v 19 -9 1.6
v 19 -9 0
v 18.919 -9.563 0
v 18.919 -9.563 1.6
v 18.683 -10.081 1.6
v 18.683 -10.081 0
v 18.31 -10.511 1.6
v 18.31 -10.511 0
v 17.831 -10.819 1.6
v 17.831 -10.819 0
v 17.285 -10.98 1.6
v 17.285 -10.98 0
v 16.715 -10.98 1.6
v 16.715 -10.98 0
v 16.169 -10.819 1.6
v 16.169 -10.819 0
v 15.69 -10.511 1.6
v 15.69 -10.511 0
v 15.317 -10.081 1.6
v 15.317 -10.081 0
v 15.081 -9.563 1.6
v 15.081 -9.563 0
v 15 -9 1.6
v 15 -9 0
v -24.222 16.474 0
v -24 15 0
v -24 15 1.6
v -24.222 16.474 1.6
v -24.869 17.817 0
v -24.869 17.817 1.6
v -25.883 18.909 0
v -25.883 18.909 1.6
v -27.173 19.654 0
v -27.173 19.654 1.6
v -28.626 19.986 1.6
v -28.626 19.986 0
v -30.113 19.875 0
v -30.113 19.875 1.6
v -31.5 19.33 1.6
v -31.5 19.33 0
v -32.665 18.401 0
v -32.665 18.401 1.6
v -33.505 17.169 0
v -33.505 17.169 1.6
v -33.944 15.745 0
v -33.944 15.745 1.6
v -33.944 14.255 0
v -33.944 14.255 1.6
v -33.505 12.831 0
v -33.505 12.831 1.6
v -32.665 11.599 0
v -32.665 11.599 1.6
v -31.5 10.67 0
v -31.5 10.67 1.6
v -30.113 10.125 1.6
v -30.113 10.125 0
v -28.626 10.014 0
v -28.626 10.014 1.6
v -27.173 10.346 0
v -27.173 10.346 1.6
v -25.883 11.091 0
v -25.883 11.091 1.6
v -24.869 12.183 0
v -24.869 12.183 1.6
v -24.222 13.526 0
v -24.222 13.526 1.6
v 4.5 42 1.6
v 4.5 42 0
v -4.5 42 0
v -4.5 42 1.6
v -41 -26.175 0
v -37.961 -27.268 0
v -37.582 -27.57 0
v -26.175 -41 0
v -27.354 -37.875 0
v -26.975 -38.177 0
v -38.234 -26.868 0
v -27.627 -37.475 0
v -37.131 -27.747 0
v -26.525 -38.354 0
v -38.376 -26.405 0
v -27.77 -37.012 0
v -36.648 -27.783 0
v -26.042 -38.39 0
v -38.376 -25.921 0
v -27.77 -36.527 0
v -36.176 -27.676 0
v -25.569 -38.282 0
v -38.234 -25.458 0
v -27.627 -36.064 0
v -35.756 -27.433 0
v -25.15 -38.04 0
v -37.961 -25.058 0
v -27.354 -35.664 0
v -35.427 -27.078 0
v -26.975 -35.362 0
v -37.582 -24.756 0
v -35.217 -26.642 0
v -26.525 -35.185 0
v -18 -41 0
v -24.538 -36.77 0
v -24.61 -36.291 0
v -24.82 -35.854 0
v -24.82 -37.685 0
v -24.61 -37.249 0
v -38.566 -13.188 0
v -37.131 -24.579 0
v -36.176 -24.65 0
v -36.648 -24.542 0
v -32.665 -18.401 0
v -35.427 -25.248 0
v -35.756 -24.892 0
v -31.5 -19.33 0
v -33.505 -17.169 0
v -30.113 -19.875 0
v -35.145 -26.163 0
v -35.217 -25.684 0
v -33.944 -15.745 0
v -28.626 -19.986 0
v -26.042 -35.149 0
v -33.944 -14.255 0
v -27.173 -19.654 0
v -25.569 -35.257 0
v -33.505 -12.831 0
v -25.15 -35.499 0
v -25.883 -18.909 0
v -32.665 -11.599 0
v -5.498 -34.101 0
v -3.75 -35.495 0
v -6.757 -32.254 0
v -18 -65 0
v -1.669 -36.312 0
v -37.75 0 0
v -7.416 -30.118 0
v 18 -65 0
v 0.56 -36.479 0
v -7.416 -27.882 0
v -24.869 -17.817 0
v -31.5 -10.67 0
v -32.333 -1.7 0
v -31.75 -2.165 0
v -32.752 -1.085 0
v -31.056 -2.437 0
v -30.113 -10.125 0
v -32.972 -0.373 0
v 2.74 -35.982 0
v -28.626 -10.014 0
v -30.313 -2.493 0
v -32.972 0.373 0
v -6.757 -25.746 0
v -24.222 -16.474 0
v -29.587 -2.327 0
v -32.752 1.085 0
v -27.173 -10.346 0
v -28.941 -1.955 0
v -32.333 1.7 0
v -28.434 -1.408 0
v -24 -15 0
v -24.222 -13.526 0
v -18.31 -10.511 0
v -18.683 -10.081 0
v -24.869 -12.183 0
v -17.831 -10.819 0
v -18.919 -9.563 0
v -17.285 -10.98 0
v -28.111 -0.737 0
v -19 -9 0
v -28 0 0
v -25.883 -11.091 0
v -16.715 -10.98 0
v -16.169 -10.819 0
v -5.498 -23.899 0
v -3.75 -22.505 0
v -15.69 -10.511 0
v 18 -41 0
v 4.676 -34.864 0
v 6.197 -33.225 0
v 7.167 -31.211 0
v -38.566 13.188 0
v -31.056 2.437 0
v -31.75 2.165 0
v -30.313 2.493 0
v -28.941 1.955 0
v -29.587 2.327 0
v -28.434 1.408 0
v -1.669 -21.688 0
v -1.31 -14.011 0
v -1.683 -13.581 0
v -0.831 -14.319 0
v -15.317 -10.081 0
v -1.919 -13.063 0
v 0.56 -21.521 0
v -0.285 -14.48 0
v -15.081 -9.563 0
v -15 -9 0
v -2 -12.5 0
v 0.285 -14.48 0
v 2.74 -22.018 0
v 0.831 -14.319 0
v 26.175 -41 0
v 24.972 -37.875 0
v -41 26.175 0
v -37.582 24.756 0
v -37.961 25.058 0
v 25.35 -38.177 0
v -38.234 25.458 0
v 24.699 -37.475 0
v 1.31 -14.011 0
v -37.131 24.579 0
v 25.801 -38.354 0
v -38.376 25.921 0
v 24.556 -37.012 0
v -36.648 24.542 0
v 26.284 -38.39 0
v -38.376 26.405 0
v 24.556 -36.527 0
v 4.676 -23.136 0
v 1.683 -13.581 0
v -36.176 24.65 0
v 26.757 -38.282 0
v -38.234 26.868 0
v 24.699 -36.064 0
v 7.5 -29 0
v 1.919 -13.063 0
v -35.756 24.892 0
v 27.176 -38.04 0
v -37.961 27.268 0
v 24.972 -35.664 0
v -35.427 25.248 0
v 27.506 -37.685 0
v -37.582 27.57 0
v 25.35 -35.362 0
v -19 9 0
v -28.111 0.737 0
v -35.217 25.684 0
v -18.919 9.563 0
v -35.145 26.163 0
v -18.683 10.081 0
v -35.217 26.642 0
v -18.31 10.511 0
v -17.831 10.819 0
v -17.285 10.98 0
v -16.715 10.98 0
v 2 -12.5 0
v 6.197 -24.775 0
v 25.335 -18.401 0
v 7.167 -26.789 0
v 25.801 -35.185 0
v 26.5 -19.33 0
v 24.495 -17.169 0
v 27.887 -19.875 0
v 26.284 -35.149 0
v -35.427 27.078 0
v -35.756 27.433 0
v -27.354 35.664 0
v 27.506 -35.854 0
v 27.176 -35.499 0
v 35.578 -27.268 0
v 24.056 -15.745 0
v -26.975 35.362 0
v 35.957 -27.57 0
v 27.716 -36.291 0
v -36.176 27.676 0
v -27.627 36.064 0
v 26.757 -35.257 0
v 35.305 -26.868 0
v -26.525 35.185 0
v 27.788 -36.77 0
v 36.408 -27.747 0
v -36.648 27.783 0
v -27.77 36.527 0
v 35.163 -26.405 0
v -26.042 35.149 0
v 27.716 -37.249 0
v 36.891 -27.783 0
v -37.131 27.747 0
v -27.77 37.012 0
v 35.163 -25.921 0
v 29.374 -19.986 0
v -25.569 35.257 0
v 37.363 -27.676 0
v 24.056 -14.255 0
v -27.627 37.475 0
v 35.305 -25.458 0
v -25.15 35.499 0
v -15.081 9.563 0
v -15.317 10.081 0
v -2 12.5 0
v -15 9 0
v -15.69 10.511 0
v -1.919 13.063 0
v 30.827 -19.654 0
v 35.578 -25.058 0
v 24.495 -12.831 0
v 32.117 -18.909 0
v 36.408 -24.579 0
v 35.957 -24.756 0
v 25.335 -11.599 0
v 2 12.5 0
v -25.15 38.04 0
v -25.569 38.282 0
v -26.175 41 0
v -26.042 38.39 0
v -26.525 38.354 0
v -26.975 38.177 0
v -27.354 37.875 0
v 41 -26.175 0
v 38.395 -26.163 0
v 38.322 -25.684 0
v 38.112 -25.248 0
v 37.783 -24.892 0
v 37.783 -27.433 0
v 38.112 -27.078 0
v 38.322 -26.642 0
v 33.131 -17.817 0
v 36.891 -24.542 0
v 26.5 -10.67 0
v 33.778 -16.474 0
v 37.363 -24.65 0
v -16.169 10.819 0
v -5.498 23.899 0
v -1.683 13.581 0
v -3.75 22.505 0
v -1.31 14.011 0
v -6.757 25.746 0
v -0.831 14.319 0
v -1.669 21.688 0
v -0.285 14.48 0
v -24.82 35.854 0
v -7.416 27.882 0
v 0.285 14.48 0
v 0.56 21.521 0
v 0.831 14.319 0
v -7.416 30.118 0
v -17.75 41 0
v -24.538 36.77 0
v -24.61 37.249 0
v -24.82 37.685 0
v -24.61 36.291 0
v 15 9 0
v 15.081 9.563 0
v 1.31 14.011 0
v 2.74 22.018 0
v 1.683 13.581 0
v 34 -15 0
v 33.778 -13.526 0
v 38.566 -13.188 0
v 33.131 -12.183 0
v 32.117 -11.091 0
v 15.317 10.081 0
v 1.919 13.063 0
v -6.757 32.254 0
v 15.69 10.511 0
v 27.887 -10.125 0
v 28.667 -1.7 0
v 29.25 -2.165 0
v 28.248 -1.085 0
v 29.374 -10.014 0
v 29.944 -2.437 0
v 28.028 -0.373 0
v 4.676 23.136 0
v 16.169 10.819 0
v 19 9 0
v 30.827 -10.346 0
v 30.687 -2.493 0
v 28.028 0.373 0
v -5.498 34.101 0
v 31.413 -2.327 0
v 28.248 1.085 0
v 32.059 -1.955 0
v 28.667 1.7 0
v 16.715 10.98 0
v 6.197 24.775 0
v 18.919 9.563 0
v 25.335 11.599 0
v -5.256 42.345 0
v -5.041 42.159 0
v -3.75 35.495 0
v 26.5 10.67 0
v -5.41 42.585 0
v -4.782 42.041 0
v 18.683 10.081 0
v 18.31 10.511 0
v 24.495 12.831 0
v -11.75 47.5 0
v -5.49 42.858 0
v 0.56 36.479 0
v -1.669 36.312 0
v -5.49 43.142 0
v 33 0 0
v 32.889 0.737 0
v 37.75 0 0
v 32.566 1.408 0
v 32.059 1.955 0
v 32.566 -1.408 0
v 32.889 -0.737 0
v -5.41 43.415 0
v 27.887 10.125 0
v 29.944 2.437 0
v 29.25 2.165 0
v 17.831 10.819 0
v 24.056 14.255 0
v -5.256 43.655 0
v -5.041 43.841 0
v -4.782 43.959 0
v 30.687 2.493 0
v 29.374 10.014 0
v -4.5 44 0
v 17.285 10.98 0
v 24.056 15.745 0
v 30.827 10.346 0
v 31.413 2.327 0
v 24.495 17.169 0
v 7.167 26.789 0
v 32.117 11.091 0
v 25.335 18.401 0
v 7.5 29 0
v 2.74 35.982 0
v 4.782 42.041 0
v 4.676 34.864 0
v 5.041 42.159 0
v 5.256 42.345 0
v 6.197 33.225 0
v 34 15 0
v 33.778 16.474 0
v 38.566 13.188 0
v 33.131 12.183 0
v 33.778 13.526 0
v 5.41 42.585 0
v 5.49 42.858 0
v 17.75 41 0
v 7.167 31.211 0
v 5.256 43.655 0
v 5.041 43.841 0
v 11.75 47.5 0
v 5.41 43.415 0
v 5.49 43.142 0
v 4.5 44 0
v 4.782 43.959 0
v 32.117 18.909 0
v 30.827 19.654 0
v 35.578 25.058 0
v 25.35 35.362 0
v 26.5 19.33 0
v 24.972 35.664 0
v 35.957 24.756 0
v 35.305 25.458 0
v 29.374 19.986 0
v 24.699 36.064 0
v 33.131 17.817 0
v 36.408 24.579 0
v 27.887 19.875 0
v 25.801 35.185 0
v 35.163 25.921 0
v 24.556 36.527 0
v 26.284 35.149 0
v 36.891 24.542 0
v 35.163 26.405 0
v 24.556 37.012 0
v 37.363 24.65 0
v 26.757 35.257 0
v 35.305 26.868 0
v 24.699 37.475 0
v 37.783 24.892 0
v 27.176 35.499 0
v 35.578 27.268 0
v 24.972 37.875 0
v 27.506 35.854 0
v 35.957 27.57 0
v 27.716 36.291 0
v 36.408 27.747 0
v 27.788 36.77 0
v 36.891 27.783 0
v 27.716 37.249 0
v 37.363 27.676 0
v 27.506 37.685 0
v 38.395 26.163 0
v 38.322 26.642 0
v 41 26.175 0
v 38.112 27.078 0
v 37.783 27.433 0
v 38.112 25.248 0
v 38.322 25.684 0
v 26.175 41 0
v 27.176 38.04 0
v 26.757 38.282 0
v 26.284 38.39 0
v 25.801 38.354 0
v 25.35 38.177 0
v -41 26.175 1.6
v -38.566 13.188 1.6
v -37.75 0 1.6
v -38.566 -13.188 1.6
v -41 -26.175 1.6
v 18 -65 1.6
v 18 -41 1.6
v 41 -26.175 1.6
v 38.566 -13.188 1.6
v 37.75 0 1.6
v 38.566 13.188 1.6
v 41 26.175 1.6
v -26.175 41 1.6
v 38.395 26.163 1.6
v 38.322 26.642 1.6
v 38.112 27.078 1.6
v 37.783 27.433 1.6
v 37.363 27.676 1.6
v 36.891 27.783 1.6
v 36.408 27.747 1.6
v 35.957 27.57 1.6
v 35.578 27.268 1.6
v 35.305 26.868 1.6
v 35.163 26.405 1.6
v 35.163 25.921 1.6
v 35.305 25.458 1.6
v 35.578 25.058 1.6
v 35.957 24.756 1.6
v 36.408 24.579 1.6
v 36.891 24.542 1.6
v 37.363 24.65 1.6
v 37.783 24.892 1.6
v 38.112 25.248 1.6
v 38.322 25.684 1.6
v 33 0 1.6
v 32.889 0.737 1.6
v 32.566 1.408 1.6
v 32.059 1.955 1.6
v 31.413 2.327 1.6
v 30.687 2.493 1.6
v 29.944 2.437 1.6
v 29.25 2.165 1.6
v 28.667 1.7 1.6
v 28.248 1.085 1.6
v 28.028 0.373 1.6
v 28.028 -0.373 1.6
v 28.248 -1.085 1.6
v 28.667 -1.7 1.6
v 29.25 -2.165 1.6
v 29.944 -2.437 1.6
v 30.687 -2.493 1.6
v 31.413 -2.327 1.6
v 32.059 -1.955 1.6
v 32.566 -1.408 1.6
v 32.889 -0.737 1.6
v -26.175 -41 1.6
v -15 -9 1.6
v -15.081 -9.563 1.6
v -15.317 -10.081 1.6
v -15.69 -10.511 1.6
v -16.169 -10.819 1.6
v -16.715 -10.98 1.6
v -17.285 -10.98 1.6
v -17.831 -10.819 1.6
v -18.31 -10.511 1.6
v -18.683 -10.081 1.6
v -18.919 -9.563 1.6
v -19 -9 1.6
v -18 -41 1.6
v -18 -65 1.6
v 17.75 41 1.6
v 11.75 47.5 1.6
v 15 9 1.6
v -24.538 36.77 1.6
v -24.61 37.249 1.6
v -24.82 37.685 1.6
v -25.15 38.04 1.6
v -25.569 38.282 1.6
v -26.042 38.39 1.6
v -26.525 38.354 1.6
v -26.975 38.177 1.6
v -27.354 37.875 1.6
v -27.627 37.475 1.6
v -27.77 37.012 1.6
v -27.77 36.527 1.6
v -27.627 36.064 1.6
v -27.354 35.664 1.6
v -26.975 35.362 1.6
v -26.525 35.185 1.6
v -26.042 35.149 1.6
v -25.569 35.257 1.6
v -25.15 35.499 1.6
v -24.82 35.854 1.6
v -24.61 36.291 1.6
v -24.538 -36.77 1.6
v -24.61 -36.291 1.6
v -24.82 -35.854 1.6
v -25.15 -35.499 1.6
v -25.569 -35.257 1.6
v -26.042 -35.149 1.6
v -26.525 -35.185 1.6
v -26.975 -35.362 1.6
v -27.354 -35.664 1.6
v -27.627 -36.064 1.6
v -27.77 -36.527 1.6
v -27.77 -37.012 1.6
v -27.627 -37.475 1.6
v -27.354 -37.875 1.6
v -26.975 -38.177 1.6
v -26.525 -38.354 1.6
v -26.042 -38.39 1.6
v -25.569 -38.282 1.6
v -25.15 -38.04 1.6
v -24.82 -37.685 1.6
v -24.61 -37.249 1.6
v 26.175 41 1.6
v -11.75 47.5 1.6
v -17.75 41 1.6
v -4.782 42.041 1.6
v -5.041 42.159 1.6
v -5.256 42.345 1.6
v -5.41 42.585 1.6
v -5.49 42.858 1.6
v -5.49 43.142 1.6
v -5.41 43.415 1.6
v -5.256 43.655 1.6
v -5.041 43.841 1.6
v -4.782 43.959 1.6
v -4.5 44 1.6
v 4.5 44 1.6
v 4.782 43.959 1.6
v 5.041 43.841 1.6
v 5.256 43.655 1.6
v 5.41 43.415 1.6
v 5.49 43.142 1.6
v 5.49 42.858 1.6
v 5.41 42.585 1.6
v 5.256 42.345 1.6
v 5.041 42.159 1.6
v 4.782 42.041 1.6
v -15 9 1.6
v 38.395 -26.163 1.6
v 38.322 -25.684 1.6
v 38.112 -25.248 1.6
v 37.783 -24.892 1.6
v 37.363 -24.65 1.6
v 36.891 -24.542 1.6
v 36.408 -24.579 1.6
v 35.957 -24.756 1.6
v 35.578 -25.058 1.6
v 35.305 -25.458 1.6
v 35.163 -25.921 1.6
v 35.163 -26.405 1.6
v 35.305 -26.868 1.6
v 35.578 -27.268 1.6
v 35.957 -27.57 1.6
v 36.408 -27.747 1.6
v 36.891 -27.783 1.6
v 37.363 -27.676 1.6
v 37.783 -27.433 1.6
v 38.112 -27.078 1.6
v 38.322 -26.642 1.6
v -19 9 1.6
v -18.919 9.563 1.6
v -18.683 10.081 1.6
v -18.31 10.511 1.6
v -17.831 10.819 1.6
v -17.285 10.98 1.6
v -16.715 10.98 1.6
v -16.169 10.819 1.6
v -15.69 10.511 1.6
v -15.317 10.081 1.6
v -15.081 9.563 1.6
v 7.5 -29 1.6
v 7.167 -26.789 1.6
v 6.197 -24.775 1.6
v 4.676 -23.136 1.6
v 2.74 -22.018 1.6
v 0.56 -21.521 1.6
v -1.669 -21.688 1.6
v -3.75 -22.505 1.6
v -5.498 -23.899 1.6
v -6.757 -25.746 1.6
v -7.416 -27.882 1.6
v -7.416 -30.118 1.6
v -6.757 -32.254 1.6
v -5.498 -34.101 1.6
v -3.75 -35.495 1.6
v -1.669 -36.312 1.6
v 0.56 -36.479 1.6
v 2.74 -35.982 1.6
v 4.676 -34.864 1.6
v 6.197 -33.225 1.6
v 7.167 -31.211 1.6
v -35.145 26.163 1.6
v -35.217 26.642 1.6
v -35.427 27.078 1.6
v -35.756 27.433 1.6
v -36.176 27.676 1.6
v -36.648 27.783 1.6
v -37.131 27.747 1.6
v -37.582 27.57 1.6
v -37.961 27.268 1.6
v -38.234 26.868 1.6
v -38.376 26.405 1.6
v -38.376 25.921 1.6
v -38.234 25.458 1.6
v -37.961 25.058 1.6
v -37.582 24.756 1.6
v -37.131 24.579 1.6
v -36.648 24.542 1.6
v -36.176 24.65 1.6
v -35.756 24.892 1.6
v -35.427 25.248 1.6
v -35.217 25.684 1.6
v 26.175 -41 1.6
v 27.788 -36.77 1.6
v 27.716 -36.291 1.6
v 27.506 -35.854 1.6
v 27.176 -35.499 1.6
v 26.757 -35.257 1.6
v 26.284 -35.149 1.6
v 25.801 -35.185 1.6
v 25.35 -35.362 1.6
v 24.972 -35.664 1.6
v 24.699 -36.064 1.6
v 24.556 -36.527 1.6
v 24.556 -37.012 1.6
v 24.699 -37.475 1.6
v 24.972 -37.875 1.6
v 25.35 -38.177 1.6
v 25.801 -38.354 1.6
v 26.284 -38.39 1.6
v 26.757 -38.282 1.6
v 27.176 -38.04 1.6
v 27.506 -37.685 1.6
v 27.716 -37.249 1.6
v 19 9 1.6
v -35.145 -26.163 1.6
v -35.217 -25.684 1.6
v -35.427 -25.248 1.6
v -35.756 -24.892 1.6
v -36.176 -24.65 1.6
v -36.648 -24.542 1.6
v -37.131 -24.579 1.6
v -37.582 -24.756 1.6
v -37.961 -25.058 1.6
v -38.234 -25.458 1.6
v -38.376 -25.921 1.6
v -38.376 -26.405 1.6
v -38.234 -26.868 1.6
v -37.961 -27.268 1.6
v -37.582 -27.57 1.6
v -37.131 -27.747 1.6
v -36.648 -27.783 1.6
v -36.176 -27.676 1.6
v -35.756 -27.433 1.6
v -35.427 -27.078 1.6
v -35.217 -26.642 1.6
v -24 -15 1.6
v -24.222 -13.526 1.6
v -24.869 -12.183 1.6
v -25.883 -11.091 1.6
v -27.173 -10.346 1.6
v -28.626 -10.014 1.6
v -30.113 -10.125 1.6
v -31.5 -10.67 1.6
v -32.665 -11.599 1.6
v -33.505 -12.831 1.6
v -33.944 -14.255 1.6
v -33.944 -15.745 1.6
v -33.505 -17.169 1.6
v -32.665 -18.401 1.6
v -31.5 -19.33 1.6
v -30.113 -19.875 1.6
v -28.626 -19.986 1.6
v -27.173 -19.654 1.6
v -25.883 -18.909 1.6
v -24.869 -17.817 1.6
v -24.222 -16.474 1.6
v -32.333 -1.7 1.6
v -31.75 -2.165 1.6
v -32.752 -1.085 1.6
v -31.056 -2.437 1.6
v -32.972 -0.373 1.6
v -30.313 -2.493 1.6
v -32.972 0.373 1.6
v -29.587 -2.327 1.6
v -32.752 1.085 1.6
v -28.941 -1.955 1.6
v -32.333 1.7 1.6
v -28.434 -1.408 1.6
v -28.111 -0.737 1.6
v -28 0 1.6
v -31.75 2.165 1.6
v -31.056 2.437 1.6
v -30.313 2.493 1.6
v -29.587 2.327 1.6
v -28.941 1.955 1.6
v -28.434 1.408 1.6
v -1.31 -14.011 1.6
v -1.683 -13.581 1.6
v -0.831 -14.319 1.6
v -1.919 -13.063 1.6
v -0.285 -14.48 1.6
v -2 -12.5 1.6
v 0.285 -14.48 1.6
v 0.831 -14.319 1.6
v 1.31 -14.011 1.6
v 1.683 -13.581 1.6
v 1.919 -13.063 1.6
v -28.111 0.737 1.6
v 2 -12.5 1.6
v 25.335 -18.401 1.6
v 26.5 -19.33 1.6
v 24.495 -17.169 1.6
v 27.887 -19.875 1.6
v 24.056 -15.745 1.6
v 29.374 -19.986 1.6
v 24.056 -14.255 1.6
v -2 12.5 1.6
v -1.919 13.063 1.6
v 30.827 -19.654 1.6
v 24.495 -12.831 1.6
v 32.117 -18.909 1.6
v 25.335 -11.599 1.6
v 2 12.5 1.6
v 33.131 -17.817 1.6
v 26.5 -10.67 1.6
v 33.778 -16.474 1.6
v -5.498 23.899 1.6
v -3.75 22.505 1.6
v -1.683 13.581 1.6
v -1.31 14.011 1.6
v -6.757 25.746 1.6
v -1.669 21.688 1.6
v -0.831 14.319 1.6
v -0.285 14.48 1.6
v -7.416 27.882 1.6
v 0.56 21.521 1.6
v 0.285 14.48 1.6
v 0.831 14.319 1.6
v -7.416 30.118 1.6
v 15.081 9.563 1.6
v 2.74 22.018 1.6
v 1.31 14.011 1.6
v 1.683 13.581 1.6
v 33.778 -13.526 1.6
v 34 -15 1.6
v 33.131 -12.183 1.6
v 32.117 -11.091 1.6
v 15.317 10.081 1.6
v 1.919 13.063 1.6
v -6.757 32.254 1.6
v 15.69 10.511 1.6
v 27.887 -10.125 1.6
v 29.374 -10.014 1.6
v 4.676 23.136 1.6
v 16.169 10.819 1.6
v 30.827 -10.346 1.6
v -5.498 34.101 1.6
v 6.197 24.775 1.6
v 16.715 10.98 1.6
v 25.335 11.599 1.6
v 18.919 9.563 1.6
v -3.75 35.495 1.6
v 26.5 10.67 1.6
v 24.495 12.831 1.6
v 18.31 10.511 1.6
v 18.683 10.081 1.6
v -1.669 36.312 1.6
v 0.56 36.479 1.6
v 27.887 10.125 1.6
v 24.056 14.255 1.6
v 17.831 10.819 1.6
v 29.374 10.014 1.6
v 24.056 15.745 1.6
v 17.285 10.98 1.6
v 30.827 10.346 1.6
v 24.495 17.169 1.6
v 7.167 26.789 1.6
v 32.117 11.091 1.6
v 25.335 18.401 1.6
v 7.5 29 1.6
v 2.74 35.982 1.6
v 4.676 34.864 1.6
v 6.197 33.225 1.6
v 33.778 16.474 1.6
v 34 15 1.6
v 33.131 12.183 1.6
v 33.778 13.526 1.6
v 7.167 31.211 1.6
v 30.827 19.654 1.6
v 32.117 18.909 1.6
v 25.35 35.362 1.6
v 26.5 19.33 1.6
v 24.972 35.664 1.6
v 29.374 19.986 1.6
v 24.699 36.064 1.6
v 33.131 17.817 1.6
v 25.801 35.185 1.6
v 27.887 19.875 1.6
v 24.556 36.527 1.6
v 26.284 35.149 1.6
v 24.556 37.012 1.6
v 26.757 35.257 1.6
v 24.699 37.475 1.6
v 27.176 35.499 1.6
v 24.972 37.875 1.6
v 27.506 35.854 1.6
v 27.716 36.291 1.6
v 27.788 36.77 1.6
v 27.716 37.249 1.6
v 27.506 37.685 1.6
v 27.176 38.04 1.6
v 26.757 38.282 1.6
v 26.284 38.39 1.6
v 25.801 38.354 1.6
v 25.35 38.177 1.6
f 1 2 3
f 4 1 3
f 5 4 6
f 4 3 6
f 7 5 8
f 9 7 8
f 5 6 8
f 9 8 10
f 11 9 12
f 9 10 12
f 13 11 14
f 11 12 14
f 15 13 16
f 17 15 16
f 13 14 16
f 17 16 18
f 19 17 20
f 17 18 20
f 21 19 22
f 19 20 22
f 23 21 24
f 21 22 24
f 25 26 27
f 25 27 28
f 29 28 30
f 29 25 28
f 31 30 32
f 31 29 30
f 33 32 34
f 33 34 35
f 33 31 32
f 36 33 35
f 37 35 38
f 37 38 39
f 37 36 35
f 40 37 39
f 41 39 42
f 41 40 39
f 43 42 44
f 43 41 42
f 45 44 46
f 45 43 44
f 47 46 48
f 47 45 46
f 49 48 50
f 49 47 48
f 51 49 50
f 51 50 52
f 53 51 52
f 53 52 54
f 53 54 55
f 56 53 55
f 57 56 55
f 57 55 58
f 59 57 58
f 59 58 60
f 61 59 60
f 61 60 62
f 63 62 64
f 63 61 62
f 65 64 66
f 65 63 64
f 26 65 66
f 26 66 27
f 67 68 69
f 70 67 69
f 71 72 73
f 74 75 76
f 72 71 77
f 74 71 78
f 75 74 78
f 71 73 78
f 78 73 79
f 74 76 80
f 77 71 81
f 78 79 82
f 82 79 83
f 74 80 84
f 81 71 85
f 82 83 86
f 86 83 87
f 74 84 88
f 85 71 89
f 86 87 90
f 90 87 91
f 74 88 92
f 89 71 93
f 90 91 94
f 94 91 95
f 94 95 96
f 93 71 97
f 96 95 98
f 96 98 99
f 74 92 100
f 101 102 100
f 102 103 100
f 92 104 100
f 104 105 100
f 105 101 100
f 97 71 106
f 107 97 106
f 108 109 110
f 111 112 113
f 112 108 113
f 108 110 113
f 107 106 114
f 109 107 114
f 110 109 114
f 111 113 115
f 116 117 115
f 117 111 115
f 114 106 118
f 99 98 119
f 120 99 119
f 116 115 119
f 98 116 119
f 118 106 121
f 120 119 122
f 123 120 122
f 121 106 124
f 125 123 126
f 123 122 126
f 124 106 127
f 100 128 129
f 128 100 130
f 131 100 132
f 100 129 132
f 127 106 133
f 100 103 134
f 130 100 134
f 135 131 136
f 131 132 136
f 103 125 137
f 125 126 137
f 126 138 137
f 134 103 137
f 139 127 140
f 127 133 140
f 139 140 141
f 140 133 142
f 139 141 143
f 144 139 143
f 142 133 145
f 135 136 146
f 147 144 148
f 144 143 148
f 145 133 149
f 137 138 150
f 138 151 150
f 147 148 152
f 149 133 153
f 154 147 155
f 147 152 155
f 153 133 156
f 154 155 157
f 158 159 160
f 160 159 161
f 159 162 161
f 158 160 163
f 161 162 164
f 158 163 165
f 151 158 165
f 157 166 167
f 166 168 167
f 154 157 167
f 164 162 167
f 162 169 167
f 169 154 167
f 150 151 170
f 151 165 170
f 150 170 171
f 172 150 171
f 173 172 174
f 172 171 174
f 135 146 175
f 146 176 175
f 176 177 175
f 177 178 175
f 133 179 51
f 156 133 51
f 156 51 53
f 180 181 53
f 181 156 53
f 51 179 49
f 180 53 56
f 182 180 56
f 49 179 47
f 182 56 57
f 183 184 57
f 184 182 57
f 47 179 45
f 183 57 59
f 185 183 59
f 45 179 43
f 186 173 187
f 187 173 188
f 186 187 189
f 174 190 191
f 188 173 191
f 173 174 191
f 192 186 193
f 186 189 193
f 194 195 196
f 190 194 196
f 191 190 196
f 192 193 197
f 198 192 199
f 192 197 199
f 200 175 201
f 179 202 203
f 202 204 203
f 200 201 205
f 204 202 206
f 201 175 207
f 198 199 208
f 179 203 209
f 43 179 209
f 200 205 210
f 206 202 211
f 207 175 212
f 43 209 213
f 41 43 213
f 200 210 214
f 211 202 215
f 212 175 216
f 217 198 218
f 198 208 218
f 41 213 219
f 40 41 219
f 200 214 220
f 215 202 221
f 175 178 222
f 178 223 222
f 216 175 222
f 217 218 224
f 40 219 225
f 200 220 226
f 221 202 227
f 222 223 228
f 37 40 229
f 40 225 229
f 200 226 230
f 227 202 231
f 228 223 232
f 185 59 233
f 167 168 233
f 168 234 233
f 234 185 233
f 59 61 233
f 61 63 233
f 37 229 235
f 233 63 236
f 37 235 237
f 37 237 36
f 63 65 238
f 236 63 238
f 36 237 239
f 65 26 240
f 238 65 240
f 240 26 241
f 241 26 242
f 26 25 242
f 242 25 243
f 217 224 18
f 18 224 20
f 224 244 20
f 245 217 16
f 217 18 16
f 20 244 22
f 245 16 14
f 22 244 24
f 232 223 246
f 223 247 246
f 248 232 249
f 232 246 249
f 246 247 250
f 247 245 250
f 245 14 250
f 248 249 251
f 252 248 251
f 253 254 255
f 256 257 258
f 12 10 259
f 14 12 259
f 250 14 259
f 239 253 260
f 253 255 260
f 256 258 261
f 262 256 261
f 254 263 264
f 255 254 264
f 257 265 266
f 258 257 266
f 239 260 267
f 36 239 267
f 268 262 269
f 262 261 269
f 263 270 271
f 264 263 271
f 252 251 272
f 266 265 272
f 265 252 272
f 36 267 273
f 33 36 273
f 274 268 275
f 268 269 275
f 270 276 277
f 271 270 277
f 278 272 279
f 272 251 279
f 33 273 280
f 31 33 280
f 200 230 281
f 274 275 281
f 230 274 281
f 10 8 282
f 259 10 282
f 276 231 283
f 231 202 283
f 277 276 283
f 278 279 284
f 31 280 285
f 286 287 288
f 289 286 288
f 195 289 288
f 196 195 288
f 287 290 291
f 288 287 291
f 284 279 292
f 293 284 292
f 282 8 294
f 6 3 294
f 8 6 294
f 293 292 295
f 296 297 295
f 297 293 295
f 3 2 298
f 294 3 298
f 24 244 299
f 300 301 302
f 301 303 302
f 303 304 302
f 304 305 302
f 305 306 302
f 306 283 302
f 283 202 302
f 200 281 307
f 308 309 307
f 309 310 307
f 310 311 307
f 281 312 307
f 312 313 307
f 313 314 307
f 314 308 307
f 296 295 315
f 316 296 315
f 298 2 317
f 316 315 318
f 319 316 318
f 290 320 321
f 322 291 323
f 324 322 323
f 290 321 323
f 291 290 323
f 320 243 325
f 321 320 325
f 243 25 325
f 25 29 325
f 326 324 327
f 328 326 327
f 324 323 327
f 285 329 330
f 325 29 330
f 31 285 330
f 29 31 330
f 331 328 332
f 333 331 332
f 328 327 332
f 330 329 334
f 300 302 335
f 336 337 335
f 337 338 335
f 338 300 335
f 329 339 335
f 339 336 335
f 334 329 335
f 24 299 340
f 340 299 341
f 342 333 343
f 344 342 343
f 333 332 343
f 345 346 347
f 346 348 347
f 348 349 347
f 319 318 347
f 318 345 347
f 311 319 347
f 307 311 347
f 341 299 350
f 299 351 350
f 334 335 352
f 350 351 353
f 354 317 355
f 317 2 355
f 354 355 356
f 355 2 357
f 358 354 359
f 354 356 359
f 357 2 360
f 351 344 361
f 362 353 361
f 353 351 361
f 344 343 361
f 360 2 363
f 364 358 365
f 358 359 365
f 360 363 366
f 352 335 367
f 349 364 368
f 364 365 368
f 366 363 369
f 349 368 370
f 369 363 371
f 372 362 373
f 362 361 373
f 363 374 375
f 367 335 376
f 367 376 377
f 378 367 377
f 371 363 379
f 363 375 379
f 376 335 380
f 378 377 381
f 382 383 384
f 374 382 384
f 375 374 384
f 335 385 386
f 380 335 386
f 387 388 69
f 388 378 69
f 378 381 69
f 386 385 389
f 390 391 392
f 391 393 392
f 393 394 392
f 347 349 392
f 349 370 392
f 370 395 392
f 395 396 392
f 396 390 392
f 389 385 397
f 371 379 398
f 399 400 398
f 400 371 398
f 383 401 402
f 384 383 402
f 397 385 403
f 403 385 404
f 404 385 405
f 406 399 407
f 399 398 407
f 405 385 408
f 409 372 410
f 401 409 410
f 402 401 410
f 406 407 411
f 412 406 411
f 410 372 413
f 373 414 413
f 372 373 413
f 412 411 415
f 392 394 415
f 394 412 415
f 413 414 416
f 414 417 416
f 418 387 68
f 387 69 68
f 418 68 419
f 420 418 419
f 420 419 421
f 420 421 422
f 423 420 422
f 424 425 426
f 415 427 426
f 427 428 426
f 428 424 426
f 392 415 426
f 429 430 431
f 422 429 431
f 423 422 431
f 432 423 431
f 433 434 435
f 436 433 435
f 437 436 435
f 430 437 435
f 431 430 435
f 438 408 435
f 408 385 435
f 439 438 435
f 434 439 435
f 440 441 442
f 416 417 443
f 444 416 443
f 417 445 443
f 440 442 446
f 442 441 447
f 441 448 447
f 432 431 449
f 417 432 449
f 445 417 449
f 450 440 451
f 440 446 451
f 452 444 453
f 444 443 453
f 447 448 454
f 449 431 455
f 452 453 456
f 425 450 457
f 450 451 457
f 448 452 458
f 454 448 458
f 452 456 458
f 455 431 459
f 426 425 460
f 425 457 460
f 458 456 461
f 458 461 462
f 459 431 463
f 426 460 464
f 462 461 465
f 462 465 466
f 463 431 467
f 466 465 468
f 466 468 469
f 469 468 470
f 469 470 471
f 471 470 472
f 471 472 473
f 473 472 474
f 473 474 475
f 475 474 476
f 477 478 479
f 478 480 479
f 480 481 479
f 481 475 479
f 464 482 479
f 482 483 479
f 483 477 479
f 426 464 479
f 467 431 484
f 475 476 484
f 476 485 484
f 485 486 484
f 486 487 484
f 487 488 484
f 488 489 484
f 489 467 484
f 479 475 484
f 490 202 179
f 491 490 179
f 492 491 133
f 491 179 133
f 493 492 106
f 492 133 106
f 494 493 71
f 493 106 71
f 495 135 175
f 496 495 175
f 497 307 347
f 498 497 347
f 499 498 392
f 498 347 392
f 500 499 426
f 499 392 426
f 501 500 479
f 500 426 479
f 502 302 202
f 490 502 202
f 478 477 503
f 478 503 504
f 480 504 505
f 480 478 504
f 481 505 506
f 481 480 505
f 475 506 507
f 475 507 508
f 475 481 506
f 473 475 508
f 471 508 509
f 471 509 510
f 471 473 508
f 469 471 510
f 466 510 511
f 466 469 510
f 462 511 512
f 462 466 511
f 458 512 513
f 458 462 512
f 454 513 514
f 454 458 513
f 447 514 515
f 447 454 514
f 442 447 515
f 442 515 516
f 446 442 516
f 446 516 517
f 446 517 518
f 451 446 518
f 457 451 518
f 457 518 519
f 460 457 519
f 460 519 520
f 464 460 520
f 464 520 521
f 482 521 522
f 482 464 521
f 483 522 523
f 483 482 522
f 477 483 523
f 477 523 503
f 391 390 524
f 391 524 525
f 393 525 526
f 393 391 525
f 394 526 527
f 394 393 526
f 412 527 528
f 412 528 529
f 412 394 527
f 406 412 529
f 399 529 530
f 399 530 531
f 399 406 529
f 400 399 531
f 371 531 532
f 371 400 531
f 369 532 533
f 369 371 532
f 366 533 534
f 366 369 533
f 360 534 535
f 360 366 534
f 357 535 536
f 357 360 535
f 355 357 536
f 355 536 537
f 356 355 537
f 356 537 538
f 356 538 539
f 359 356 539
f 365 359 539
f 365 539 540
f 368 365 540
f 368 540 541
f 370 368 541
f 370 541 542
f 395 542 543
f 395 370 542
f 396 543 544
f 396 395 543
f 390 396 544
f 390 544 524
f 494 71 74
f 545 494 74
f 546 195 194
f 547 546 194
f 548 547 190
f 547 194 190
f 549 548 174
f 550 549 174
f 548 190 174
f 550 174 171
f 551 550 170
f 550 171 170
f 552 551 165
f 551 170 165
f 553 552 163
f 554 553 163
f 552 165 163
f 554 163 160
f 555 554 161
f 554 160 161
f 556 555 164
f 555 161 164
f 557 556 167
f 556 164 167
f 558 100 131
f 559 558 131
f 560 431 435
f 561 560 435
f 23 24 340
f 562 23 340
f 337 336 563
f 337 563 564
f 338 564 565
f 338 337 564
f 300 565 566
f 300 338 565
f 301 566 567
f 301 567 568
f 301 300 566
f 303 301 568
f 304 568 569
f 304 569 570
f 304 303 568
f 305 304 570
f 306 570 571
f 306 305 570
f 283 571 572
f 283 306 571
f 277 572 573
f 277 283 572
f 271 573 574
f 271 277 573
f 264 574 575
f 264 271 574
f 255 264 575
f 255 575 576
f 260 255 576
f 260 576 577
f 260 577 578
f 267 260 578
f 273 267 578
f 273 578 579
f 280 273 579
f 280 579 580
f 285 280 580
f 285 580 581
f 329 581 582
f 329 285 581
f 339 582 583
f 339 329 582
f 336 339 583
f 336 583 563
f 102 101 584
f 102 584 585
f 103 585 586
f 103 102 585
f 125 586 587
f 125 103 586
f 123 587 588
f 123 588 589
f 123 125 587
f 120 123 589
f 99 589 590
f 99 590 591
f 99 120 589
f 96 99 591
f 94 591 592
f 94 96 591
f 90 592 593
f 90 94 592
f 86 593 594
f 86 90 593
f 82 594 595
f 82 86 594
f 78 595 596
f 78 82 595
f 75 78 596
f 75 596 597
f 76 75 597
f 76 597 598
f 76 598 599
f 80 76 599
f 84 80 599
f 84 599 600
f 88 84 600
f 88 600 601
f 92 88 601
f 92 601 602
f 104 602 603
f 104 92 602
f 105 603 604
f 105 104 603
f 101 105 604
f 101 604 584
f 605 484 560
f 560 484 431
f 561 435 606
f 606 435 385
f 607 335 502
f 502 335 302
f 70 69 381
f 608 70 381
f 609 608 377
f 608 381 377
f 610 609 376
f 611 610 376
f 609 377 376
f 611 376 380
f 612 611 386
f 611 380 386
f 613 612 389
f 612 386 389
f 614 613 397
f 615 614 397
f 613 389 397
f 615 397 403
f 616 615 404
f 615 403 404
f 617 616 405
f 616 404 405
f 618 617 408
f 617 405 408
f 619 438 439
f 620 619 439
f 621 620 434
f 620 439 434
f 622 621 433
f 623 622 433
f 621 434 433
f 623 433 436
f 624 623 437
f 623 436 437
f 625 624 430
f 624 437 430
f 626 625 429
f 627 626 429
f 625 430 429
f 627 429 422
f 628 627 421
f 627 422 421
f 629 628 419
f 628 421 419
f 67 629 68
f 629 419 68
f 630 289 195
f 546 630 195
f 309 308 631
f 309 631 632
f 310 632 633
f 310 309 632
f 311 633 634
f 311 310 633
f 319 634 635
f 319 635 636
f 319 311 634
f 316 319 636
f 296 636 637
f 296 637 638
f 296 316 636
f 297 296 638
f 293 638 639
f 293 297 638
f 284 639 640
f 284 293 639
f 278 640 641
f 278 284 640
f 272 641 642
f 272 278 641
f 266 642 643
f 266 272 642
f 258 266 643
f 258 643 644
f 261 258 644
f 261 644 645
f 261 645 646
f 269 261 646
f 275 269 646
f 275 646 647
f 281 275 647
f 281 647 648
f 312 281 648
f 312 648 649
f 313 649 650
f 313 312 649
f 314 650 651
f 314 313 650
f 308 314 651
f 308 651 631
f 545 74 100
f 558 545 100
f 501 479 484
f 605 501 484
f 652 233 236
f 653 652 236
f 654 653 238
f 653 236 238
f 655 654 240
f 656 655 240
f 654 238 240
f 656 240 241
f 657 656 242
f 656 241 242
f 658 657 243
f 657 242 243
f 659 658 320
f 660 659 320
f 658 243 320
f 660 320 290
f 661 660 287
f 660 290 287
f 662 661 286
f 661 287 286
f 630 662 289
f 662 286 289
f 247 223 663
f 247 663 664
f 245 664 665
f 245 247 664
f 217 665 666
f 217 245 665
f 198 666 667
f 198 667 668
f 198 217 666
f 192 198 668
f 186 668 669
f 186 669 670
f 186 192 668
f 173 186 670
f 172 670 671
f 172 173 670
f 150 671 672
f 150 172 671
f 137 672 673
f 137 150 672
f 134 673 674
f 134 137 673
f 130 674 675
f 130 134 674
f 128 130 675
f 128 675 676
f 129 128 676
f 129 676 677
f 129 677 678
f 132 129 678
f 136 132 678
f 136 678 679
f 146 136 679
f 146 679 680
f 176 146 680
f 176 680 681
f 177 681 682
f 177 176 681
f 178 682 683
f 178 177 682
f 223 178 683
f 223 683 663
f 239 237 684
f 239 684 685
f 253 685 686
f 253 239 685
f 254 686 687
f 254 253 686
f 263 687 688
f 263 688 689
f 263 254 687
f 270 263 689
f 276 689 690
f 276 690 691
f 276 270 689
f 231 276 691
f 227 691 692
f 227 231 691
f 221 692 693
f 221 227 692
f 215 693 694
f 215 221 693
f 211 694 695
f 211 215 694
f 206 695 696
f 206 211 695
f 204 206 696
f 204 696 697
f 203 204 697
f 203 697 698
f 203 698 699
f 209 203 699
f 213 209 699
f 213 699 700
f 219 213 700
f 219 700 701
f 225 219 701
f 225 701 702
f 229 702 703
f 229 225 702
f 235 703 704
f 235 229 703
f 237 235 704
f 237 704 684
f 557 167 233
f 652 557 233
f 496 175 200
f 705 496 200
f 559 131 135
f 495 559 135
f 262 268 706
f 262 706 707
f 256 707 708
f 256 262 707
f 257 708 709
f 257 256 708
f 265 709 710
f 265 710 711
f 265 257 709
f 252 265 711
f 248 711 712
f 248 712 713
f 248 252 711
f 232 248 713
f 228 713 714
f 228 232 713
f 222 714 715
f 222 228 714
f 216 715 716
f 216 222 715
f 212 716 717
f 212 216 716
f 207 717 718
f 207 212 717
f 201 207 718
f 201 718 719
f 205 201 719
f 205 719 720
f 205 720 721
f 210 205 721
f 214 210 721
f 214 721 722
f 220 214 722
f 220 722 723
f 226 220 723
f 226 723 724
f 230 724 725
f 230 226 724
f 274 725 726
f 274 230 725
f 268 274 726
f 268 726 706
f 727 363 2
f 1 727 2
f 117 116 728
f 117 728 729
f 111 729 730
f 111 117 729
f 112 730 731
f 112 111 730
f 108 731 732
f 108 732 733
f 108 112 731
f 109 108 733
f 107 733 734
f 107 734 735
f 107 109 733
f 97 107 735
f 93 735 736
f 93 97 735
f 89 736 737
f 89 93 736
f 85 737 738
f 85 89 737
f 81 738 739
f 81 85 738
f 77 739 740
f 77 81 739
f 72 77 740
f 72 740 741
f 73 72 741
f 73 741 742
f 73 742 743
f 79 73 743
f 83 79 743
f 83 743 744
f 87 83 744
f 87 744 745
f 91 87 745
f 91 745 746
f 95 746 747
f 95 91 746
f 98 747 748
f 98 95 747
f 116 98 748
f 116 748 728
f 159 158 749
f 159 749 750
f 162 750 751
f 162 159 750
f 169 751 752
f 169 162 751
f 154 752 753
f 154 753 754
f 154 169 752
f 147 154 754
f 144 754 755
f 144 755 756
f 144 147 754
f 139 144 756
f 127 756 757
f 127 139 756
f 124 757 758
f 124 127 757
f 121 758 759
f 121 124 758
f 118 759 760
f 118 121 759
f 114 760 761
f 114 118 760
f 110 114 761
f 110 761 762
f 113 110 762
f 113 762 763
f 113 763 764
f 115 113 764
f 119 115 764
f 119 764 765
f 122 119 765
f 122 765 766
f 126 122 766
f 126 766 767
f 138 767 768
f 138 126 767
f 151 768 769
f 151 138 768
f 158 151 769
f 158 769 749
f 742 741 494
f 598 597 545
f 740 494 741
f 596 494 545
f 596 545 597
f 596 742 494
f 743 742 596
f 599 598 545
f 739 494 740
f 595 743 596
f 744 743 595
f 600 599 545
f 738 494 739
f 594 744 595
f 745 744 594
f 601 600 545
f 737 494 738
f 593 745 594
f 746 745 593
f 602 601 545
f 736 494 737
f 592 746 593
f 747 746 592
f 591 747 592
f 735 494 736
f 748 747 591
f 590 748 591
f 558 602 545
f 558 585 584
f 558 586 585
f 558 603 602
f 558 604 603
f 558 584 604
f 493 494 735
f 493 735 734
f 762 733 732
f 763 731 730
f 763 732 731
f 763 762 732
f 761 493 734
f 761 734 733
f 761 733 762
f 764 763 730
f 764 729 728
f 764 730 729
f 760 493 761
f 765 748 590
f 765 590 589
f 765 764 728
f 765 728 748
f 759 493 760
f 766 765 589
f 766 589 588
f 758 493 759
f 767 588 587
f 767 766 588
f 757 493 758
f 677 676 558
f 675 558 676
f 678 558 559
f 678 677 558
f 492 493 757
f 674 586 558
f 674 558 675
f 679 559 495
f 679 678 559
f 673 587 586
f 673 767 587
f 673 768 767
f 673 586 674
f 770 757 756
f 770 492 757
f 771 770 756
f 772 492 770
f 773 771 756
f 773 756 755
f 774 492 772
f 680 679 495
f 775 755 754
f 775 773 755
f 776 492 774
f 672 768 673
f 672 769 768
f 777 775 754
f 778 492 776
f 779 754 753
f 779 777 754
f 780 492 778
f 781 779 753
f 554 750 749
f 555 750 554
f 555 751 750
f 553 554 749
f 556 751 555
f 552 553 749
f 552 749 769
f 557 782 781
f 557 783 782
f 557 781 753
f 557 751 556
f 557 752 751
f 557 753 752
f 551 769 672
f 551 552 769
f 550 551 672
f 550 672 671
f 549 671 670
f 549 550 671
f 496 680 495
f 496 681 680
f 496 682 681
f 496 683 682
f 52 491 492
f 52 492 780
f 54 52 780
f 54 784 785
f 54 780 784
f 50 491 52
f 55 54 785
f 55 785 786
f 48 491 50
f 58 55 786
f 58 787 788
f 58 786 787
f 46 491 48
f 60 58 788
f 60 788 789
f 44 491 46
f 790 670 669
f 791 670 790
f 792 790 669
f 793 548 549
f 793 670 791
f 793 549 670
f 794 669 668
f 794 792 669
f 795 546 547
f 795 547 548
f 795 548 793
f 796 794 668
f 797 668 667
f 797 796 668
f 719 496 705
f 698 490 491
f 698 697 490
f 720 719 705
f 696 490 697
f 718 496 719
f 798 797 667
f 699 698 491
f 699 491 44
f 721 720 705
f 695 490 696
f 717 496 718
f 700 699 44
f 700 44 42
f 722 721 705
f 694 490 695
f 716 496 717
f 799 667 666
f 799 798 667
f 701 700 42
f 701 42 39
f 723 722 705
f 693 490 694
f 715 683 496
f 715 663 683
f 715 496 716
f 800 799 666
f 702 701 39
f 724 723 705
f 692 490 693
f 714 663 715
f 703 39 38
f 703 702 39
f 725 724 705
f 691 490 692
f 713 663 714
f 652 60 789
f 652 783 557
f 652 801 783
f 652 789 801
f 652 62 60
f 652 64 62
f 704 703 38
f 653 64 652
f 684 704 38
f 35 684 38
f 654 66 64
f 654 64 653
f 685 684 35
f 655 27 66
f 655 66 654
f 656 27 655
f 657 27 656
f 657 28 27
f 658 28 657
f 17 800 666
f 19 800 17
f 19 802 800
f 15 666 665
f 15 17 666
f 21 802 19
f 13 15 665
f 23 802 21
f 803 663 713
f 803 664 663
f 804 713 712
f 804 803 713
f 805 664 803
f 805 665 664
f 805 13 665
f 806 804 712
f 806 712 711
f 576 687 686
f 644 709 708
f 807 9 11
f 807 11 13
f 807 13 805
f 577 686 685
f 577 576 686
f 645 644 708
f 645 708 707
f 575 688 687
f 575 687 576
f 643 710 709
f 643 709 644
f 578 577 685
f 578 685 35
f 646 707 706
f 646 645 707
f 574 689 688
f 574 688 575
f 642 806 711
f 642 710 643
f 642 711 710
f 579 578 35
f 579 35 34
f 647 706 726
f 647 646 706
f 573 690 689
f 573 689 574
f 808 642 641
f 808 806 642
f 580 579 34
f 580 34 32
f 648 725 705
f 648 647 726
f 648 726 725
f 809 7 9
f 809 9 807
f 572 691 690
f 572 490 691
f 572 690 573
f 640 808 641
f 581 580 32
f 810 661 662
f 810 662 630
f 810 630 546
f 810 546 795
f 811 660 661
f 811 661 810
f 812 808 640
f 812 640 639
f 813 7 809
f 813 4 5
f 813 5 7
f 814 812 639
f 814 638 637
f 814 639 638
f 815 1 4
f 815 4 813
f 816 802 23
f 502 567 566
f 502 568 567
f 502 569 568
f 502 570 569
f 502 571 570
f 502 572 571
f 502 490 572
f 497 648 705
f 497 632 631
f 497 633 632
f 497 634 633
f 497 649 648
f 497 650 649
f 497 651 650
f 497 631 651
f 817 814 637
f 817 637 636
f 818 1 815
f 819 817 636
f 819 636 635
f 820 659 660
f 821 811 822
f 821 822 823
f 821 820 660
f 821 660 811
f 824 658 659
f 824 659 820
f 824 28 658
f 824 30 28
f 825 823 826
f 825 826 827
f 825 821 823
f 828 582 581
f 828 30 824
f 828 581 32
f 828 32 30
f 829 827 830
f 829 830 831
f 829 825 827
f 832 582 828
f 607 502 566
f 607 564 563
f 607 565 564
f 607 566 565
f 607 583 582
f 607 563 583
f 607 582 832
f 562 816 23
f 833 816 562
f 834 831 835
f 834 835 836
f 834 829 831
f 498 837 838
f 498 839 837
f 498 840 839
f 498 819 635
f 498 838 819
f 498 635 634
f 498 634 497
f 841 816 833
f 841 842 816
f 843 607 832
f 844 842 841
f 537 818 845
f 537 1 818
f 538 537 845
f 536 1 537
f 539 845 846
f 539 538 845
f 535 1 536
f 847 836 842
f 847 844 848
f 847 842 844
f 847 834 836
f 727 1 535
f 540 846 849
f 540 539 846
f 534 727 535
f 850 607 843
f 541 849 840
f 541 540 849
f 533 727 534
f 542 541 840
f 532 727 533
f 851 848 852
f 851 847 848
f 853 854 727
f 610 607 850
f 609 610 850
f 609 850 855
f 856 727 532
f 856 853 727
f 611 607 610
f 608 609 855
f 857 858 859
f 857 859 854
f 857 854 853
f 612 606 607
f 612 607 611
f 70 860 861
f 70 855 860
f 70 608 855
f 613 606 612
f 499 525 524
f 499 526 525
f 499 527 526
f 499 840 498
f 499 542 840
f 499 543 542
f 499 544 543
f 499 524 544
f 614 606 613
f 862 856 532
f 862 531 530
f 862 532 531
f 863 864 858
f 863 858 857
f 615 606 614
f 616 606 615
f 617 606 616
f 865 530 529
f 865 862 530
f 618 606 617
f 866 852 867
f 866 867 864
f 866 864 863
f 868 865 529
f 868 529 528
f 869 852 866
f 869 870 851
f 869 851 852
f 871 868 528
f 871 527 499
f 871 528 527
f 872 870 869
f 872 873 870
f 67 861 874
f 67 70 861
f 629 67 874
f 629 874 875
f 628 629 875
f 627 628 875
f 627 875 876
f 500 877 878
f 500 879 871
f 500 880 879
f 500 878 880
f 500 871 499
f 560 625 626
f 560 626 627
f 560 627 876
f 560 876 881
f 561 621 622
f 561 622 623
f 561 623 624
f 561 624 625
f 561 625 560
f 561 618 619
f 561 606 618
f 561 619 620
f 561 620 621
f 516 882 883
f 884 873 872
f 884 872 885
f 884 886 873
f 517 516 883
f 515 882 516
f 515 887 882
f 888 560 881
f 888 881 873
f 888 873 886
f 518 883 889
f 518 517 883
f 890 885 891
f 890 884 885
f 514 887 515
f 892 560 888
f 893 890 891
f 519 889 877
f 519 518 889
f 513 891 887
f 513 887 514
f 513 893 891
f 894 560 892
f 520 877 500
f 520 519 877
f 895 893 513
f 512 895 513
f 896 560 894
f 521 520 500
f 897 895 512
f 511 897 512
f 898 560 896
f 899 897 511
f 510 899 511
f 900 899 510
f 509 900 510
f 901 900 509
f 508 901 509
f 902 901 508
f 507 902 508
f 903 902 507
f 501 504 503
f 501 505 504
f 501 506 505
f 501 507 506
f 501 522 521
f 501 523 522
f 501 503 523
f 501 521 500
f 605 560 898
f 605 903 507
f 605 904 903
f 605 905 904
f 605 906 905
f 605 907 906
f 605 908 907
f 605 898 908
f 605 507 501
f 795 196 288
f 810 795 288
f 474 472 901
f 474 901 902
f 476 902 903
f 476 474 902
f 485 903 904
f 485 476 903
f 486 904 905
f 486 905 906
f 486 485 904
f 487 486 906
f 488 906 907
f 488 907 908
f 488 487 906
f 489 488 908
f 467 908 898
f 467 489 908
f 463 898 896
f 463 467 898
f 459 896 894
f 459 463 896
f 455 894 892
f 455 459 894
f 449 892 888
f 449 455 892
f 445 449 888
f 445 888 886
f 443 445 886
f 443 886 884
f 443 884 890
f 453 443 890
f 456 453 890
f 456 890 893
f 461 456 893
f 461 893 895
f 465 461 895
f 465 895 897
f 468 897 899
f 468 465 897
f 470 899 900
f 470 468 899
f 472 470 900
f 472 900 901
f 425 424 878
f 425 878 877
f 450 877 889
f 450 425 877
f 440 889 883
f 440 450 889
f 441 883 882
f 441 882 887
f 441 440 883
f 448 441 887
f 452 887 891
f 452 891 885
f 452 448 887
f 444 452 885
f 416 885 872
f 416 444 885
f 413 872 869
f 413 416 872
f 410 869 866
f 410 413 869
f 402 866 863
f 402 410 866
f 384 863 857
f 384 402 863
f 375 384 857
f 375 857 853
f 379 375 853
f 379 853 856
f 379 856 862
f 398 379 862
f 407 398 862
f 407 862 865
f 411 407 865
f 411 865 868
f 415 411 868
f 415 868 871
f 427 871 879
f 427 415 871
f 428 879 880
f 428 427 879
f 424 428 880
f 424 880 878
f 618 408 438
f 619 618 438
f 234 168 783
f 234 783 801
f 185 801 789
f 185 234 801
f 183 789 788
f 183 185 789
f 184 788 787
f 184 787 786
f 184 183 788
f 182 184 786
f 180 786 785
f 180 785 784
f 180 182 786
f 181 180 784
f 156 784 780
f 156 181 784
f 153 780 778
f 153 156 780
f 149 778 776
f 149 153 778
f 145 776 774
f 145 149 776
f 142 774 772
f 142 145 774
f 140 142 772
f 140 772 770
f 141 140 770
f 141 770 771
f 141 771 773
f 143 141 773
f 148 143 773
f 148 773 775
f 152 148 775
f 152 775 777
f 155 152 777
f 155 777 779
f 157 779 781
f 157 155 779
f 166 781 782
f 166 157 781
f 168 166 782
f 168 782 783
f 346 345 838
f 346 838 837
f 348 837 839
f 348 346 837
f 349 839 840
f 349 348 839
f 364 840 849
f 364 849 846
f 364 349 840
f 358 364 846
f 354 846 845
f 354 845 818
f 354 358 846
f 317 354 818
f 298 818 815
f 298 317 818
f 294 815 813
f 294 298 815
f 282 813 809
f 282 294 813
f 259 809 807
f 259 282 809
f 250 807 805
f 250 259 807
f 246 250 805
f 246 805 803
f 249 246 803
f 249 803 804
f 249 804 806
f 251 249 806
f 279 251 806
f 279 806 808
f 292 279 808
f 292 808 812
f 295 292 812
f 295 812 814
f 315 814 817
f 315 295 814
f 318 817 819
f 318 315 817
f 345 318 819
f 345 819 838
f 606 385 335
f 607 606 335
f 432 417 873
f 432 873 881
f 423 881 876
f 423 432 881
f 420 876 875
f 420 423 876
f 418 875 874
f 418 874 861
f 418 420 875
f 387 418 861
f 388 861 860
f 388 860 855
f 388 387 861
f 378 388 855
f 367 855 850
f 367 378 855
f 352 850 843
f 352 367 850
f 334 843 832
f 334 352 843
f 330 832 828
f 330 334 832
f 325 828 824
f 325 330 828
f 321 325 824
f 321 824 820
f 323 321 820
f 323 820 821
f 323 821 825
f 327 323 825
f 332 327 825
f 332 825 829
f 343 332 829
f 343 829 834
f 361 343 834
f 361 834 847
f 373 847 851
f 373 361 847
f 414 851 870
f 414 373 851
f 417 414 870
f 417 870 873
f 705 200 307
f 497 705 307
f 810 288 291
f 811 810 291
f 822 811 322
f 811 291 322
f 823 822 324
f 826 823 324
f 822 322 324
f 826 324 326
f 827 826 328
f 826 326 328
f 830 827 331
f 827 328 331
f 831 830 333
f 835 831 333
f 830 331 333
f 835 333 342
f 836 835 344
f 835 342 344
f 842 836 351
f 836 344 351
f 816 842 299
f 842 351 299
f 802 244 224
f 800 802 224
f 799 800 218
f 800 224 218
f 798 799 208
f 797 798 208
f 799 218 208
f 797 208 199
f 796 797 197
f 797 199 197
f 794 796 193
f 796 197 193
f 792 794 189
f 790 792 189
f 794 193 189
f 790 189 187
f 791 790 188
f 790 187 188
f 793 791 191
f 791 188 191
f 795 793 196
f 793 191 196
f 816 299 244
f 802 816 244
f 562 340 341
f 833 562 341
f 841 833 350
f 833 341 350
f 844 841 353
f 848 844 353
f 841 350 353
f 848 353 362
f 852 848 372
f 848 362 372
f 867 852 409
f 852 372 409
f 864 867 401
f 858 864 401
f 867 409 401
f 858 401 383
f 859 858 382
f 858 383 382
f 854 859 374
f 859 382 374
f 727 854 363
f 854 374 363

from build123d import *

# Parameters (mm, degrees)
F0_R     = 1.625
F0_R_2   = 5
F0_R_3   = 7.5
F0_R_4   = 2.5
F1_DEPTH = 1.6002


with BuildPart() as f1:
    # F0 (on Top) → F1 (new body)
    with BuildSketch(Plane.XY):
        with BuildLine():
            Line((11.75, 47.5), (-11.75, 47.5))
            Line((-11.75, 47.5), (-17.75, 41))
            Line((-17.75, 41), (-26.175144, 41))
            Line((-26.175144, 41), (-41, 26.175144))
            ThreePointArc((-41, 26.175144), (-37.75, 0), (-41, -26.175144))
            Line((-41, -26.175144), (-26.175144, -41))
            Line((-26.175144, -41), (-18, -41))
            Line((-18, -41), (-18, -65))
            Line((-18, -65), (18, -65))
            Line((18, -65), (18, -41))
            Line((18, -41), (26.175144, -41))
            Line((26.175144, -41), (41, -26.175144))
            ThreePointArc((41, -26.175144), (37.75, 0), (41, 26.175144))
            Line((41, 26.175144), (26.175144, 41))
            Line((26.175144, 41), (17.75, 41))
            Line((17.75, 41), (11.75, 47.5))
        make_face()
        with Locations((-36.769553, -26.162951)):
            Circle(F0_R, mode=Mode.SUBTRACT)
        with Locations((-26.162951, -36.769553)):
            Circle(F0_R, mode=Mode.SUBTRACT)
        with Locations((-29, -15)):
            Circle(F0_R_2, mode=Mode.SUBTRACT)
        with Locations((0, -29)):
            Circle(F0_R_3, mode=Mode.SUBTRACT)
        with Locations((26.162951, -36.769553)):
            Circle(F0_R, mode=Mode.SUBTRACT)
        with Locations((36.769553, -26.162951)):
            Circle(F0_R, mode=Mode.SUBTRACT)
        with Locations((29, -15)):
            Circle(F0_R_2, mode=Mode.SUBTRACT)
        with Locations((-30.5, 0)):
            Circle(F0_R_4, mode=Mode.SUBTRACT)
        with Locations((-29, 15)):
            Circle(F0_R_2, mode=Mode.SUBTRACT)
        with BuildLine():
            Line((-19, -9), (-19, 9))
            ThreePointArc((-19, 9), (-17, 11), (-15, 9))
            Line((-15, 9), (-15, -9))
            ThreePointArc((-15, -9), (-17, -11), (-19, -9))
        make_face(mode=Mode.SUBTRACT)
        with Locations((-36.769553, 26.162951)):
            Circle(F0_R, mode=Mode.SUBTRACT)
        with Locations((-26.162951, 36.769553)):
            Circle(F0_R, mode=Mode.SUBTRACT)
        with BuildLine():
            Line((-2, -12.5), (-2, 12.5))
            ThreePointArc((-2, 12.5), (0, 14.5), (2, 12.5))
            Line((2, 12.5), (2, -12.5))
            ThreePointArc((2, -12.5), (0, -14.5), (-2, -12.5))
        make_face(mode=Mode.SUBTRACT)
        with BuildLine():
            Line((19, 9), (19, -9))
            ThreePointArc((19, -9), (17, -11), (15, -9))
            Line((15, -9), (15, 9))
            ThreePointArc((15, 9), (17, 11), (19, 9))
        make_face(mode=Mode.SUBTRACT)
        with Locations((30.5, 0)):
            Circle(F0_R_4, mode=Mode.SUBTRACT)
        with Locations((29, 15)):
            Circle(F0_R_2, mode=Mode.SUBTRACT)
        with Locations((0, 29)):
            Circle(F0_R_3, mode=Mode.SUBTRACT)
        with BuildLine():
            ThreePointArc((-4.5, 42), (-5.5, 43), (-4.5, 44))
            Line((-4.5, 44), (4.5, 44))
            ThreePointArc((4.5, 44), (5.5, 43), (4.5, 42))
            Line((4.5, 42), (-4.5, 42))
        make_face(mode=Mode.SUBTRACT)
        with Locations((36.769553, 26.162951)):
            Circle(F0_R, mode=Mode.SUBTRACT)
        with Locations((26.162951, 36.769553)):
            Circle(F0_R, mode=Mode.SUBTRACT)
    extrude(amount=F1_DEPTH)


solid = f1.part
